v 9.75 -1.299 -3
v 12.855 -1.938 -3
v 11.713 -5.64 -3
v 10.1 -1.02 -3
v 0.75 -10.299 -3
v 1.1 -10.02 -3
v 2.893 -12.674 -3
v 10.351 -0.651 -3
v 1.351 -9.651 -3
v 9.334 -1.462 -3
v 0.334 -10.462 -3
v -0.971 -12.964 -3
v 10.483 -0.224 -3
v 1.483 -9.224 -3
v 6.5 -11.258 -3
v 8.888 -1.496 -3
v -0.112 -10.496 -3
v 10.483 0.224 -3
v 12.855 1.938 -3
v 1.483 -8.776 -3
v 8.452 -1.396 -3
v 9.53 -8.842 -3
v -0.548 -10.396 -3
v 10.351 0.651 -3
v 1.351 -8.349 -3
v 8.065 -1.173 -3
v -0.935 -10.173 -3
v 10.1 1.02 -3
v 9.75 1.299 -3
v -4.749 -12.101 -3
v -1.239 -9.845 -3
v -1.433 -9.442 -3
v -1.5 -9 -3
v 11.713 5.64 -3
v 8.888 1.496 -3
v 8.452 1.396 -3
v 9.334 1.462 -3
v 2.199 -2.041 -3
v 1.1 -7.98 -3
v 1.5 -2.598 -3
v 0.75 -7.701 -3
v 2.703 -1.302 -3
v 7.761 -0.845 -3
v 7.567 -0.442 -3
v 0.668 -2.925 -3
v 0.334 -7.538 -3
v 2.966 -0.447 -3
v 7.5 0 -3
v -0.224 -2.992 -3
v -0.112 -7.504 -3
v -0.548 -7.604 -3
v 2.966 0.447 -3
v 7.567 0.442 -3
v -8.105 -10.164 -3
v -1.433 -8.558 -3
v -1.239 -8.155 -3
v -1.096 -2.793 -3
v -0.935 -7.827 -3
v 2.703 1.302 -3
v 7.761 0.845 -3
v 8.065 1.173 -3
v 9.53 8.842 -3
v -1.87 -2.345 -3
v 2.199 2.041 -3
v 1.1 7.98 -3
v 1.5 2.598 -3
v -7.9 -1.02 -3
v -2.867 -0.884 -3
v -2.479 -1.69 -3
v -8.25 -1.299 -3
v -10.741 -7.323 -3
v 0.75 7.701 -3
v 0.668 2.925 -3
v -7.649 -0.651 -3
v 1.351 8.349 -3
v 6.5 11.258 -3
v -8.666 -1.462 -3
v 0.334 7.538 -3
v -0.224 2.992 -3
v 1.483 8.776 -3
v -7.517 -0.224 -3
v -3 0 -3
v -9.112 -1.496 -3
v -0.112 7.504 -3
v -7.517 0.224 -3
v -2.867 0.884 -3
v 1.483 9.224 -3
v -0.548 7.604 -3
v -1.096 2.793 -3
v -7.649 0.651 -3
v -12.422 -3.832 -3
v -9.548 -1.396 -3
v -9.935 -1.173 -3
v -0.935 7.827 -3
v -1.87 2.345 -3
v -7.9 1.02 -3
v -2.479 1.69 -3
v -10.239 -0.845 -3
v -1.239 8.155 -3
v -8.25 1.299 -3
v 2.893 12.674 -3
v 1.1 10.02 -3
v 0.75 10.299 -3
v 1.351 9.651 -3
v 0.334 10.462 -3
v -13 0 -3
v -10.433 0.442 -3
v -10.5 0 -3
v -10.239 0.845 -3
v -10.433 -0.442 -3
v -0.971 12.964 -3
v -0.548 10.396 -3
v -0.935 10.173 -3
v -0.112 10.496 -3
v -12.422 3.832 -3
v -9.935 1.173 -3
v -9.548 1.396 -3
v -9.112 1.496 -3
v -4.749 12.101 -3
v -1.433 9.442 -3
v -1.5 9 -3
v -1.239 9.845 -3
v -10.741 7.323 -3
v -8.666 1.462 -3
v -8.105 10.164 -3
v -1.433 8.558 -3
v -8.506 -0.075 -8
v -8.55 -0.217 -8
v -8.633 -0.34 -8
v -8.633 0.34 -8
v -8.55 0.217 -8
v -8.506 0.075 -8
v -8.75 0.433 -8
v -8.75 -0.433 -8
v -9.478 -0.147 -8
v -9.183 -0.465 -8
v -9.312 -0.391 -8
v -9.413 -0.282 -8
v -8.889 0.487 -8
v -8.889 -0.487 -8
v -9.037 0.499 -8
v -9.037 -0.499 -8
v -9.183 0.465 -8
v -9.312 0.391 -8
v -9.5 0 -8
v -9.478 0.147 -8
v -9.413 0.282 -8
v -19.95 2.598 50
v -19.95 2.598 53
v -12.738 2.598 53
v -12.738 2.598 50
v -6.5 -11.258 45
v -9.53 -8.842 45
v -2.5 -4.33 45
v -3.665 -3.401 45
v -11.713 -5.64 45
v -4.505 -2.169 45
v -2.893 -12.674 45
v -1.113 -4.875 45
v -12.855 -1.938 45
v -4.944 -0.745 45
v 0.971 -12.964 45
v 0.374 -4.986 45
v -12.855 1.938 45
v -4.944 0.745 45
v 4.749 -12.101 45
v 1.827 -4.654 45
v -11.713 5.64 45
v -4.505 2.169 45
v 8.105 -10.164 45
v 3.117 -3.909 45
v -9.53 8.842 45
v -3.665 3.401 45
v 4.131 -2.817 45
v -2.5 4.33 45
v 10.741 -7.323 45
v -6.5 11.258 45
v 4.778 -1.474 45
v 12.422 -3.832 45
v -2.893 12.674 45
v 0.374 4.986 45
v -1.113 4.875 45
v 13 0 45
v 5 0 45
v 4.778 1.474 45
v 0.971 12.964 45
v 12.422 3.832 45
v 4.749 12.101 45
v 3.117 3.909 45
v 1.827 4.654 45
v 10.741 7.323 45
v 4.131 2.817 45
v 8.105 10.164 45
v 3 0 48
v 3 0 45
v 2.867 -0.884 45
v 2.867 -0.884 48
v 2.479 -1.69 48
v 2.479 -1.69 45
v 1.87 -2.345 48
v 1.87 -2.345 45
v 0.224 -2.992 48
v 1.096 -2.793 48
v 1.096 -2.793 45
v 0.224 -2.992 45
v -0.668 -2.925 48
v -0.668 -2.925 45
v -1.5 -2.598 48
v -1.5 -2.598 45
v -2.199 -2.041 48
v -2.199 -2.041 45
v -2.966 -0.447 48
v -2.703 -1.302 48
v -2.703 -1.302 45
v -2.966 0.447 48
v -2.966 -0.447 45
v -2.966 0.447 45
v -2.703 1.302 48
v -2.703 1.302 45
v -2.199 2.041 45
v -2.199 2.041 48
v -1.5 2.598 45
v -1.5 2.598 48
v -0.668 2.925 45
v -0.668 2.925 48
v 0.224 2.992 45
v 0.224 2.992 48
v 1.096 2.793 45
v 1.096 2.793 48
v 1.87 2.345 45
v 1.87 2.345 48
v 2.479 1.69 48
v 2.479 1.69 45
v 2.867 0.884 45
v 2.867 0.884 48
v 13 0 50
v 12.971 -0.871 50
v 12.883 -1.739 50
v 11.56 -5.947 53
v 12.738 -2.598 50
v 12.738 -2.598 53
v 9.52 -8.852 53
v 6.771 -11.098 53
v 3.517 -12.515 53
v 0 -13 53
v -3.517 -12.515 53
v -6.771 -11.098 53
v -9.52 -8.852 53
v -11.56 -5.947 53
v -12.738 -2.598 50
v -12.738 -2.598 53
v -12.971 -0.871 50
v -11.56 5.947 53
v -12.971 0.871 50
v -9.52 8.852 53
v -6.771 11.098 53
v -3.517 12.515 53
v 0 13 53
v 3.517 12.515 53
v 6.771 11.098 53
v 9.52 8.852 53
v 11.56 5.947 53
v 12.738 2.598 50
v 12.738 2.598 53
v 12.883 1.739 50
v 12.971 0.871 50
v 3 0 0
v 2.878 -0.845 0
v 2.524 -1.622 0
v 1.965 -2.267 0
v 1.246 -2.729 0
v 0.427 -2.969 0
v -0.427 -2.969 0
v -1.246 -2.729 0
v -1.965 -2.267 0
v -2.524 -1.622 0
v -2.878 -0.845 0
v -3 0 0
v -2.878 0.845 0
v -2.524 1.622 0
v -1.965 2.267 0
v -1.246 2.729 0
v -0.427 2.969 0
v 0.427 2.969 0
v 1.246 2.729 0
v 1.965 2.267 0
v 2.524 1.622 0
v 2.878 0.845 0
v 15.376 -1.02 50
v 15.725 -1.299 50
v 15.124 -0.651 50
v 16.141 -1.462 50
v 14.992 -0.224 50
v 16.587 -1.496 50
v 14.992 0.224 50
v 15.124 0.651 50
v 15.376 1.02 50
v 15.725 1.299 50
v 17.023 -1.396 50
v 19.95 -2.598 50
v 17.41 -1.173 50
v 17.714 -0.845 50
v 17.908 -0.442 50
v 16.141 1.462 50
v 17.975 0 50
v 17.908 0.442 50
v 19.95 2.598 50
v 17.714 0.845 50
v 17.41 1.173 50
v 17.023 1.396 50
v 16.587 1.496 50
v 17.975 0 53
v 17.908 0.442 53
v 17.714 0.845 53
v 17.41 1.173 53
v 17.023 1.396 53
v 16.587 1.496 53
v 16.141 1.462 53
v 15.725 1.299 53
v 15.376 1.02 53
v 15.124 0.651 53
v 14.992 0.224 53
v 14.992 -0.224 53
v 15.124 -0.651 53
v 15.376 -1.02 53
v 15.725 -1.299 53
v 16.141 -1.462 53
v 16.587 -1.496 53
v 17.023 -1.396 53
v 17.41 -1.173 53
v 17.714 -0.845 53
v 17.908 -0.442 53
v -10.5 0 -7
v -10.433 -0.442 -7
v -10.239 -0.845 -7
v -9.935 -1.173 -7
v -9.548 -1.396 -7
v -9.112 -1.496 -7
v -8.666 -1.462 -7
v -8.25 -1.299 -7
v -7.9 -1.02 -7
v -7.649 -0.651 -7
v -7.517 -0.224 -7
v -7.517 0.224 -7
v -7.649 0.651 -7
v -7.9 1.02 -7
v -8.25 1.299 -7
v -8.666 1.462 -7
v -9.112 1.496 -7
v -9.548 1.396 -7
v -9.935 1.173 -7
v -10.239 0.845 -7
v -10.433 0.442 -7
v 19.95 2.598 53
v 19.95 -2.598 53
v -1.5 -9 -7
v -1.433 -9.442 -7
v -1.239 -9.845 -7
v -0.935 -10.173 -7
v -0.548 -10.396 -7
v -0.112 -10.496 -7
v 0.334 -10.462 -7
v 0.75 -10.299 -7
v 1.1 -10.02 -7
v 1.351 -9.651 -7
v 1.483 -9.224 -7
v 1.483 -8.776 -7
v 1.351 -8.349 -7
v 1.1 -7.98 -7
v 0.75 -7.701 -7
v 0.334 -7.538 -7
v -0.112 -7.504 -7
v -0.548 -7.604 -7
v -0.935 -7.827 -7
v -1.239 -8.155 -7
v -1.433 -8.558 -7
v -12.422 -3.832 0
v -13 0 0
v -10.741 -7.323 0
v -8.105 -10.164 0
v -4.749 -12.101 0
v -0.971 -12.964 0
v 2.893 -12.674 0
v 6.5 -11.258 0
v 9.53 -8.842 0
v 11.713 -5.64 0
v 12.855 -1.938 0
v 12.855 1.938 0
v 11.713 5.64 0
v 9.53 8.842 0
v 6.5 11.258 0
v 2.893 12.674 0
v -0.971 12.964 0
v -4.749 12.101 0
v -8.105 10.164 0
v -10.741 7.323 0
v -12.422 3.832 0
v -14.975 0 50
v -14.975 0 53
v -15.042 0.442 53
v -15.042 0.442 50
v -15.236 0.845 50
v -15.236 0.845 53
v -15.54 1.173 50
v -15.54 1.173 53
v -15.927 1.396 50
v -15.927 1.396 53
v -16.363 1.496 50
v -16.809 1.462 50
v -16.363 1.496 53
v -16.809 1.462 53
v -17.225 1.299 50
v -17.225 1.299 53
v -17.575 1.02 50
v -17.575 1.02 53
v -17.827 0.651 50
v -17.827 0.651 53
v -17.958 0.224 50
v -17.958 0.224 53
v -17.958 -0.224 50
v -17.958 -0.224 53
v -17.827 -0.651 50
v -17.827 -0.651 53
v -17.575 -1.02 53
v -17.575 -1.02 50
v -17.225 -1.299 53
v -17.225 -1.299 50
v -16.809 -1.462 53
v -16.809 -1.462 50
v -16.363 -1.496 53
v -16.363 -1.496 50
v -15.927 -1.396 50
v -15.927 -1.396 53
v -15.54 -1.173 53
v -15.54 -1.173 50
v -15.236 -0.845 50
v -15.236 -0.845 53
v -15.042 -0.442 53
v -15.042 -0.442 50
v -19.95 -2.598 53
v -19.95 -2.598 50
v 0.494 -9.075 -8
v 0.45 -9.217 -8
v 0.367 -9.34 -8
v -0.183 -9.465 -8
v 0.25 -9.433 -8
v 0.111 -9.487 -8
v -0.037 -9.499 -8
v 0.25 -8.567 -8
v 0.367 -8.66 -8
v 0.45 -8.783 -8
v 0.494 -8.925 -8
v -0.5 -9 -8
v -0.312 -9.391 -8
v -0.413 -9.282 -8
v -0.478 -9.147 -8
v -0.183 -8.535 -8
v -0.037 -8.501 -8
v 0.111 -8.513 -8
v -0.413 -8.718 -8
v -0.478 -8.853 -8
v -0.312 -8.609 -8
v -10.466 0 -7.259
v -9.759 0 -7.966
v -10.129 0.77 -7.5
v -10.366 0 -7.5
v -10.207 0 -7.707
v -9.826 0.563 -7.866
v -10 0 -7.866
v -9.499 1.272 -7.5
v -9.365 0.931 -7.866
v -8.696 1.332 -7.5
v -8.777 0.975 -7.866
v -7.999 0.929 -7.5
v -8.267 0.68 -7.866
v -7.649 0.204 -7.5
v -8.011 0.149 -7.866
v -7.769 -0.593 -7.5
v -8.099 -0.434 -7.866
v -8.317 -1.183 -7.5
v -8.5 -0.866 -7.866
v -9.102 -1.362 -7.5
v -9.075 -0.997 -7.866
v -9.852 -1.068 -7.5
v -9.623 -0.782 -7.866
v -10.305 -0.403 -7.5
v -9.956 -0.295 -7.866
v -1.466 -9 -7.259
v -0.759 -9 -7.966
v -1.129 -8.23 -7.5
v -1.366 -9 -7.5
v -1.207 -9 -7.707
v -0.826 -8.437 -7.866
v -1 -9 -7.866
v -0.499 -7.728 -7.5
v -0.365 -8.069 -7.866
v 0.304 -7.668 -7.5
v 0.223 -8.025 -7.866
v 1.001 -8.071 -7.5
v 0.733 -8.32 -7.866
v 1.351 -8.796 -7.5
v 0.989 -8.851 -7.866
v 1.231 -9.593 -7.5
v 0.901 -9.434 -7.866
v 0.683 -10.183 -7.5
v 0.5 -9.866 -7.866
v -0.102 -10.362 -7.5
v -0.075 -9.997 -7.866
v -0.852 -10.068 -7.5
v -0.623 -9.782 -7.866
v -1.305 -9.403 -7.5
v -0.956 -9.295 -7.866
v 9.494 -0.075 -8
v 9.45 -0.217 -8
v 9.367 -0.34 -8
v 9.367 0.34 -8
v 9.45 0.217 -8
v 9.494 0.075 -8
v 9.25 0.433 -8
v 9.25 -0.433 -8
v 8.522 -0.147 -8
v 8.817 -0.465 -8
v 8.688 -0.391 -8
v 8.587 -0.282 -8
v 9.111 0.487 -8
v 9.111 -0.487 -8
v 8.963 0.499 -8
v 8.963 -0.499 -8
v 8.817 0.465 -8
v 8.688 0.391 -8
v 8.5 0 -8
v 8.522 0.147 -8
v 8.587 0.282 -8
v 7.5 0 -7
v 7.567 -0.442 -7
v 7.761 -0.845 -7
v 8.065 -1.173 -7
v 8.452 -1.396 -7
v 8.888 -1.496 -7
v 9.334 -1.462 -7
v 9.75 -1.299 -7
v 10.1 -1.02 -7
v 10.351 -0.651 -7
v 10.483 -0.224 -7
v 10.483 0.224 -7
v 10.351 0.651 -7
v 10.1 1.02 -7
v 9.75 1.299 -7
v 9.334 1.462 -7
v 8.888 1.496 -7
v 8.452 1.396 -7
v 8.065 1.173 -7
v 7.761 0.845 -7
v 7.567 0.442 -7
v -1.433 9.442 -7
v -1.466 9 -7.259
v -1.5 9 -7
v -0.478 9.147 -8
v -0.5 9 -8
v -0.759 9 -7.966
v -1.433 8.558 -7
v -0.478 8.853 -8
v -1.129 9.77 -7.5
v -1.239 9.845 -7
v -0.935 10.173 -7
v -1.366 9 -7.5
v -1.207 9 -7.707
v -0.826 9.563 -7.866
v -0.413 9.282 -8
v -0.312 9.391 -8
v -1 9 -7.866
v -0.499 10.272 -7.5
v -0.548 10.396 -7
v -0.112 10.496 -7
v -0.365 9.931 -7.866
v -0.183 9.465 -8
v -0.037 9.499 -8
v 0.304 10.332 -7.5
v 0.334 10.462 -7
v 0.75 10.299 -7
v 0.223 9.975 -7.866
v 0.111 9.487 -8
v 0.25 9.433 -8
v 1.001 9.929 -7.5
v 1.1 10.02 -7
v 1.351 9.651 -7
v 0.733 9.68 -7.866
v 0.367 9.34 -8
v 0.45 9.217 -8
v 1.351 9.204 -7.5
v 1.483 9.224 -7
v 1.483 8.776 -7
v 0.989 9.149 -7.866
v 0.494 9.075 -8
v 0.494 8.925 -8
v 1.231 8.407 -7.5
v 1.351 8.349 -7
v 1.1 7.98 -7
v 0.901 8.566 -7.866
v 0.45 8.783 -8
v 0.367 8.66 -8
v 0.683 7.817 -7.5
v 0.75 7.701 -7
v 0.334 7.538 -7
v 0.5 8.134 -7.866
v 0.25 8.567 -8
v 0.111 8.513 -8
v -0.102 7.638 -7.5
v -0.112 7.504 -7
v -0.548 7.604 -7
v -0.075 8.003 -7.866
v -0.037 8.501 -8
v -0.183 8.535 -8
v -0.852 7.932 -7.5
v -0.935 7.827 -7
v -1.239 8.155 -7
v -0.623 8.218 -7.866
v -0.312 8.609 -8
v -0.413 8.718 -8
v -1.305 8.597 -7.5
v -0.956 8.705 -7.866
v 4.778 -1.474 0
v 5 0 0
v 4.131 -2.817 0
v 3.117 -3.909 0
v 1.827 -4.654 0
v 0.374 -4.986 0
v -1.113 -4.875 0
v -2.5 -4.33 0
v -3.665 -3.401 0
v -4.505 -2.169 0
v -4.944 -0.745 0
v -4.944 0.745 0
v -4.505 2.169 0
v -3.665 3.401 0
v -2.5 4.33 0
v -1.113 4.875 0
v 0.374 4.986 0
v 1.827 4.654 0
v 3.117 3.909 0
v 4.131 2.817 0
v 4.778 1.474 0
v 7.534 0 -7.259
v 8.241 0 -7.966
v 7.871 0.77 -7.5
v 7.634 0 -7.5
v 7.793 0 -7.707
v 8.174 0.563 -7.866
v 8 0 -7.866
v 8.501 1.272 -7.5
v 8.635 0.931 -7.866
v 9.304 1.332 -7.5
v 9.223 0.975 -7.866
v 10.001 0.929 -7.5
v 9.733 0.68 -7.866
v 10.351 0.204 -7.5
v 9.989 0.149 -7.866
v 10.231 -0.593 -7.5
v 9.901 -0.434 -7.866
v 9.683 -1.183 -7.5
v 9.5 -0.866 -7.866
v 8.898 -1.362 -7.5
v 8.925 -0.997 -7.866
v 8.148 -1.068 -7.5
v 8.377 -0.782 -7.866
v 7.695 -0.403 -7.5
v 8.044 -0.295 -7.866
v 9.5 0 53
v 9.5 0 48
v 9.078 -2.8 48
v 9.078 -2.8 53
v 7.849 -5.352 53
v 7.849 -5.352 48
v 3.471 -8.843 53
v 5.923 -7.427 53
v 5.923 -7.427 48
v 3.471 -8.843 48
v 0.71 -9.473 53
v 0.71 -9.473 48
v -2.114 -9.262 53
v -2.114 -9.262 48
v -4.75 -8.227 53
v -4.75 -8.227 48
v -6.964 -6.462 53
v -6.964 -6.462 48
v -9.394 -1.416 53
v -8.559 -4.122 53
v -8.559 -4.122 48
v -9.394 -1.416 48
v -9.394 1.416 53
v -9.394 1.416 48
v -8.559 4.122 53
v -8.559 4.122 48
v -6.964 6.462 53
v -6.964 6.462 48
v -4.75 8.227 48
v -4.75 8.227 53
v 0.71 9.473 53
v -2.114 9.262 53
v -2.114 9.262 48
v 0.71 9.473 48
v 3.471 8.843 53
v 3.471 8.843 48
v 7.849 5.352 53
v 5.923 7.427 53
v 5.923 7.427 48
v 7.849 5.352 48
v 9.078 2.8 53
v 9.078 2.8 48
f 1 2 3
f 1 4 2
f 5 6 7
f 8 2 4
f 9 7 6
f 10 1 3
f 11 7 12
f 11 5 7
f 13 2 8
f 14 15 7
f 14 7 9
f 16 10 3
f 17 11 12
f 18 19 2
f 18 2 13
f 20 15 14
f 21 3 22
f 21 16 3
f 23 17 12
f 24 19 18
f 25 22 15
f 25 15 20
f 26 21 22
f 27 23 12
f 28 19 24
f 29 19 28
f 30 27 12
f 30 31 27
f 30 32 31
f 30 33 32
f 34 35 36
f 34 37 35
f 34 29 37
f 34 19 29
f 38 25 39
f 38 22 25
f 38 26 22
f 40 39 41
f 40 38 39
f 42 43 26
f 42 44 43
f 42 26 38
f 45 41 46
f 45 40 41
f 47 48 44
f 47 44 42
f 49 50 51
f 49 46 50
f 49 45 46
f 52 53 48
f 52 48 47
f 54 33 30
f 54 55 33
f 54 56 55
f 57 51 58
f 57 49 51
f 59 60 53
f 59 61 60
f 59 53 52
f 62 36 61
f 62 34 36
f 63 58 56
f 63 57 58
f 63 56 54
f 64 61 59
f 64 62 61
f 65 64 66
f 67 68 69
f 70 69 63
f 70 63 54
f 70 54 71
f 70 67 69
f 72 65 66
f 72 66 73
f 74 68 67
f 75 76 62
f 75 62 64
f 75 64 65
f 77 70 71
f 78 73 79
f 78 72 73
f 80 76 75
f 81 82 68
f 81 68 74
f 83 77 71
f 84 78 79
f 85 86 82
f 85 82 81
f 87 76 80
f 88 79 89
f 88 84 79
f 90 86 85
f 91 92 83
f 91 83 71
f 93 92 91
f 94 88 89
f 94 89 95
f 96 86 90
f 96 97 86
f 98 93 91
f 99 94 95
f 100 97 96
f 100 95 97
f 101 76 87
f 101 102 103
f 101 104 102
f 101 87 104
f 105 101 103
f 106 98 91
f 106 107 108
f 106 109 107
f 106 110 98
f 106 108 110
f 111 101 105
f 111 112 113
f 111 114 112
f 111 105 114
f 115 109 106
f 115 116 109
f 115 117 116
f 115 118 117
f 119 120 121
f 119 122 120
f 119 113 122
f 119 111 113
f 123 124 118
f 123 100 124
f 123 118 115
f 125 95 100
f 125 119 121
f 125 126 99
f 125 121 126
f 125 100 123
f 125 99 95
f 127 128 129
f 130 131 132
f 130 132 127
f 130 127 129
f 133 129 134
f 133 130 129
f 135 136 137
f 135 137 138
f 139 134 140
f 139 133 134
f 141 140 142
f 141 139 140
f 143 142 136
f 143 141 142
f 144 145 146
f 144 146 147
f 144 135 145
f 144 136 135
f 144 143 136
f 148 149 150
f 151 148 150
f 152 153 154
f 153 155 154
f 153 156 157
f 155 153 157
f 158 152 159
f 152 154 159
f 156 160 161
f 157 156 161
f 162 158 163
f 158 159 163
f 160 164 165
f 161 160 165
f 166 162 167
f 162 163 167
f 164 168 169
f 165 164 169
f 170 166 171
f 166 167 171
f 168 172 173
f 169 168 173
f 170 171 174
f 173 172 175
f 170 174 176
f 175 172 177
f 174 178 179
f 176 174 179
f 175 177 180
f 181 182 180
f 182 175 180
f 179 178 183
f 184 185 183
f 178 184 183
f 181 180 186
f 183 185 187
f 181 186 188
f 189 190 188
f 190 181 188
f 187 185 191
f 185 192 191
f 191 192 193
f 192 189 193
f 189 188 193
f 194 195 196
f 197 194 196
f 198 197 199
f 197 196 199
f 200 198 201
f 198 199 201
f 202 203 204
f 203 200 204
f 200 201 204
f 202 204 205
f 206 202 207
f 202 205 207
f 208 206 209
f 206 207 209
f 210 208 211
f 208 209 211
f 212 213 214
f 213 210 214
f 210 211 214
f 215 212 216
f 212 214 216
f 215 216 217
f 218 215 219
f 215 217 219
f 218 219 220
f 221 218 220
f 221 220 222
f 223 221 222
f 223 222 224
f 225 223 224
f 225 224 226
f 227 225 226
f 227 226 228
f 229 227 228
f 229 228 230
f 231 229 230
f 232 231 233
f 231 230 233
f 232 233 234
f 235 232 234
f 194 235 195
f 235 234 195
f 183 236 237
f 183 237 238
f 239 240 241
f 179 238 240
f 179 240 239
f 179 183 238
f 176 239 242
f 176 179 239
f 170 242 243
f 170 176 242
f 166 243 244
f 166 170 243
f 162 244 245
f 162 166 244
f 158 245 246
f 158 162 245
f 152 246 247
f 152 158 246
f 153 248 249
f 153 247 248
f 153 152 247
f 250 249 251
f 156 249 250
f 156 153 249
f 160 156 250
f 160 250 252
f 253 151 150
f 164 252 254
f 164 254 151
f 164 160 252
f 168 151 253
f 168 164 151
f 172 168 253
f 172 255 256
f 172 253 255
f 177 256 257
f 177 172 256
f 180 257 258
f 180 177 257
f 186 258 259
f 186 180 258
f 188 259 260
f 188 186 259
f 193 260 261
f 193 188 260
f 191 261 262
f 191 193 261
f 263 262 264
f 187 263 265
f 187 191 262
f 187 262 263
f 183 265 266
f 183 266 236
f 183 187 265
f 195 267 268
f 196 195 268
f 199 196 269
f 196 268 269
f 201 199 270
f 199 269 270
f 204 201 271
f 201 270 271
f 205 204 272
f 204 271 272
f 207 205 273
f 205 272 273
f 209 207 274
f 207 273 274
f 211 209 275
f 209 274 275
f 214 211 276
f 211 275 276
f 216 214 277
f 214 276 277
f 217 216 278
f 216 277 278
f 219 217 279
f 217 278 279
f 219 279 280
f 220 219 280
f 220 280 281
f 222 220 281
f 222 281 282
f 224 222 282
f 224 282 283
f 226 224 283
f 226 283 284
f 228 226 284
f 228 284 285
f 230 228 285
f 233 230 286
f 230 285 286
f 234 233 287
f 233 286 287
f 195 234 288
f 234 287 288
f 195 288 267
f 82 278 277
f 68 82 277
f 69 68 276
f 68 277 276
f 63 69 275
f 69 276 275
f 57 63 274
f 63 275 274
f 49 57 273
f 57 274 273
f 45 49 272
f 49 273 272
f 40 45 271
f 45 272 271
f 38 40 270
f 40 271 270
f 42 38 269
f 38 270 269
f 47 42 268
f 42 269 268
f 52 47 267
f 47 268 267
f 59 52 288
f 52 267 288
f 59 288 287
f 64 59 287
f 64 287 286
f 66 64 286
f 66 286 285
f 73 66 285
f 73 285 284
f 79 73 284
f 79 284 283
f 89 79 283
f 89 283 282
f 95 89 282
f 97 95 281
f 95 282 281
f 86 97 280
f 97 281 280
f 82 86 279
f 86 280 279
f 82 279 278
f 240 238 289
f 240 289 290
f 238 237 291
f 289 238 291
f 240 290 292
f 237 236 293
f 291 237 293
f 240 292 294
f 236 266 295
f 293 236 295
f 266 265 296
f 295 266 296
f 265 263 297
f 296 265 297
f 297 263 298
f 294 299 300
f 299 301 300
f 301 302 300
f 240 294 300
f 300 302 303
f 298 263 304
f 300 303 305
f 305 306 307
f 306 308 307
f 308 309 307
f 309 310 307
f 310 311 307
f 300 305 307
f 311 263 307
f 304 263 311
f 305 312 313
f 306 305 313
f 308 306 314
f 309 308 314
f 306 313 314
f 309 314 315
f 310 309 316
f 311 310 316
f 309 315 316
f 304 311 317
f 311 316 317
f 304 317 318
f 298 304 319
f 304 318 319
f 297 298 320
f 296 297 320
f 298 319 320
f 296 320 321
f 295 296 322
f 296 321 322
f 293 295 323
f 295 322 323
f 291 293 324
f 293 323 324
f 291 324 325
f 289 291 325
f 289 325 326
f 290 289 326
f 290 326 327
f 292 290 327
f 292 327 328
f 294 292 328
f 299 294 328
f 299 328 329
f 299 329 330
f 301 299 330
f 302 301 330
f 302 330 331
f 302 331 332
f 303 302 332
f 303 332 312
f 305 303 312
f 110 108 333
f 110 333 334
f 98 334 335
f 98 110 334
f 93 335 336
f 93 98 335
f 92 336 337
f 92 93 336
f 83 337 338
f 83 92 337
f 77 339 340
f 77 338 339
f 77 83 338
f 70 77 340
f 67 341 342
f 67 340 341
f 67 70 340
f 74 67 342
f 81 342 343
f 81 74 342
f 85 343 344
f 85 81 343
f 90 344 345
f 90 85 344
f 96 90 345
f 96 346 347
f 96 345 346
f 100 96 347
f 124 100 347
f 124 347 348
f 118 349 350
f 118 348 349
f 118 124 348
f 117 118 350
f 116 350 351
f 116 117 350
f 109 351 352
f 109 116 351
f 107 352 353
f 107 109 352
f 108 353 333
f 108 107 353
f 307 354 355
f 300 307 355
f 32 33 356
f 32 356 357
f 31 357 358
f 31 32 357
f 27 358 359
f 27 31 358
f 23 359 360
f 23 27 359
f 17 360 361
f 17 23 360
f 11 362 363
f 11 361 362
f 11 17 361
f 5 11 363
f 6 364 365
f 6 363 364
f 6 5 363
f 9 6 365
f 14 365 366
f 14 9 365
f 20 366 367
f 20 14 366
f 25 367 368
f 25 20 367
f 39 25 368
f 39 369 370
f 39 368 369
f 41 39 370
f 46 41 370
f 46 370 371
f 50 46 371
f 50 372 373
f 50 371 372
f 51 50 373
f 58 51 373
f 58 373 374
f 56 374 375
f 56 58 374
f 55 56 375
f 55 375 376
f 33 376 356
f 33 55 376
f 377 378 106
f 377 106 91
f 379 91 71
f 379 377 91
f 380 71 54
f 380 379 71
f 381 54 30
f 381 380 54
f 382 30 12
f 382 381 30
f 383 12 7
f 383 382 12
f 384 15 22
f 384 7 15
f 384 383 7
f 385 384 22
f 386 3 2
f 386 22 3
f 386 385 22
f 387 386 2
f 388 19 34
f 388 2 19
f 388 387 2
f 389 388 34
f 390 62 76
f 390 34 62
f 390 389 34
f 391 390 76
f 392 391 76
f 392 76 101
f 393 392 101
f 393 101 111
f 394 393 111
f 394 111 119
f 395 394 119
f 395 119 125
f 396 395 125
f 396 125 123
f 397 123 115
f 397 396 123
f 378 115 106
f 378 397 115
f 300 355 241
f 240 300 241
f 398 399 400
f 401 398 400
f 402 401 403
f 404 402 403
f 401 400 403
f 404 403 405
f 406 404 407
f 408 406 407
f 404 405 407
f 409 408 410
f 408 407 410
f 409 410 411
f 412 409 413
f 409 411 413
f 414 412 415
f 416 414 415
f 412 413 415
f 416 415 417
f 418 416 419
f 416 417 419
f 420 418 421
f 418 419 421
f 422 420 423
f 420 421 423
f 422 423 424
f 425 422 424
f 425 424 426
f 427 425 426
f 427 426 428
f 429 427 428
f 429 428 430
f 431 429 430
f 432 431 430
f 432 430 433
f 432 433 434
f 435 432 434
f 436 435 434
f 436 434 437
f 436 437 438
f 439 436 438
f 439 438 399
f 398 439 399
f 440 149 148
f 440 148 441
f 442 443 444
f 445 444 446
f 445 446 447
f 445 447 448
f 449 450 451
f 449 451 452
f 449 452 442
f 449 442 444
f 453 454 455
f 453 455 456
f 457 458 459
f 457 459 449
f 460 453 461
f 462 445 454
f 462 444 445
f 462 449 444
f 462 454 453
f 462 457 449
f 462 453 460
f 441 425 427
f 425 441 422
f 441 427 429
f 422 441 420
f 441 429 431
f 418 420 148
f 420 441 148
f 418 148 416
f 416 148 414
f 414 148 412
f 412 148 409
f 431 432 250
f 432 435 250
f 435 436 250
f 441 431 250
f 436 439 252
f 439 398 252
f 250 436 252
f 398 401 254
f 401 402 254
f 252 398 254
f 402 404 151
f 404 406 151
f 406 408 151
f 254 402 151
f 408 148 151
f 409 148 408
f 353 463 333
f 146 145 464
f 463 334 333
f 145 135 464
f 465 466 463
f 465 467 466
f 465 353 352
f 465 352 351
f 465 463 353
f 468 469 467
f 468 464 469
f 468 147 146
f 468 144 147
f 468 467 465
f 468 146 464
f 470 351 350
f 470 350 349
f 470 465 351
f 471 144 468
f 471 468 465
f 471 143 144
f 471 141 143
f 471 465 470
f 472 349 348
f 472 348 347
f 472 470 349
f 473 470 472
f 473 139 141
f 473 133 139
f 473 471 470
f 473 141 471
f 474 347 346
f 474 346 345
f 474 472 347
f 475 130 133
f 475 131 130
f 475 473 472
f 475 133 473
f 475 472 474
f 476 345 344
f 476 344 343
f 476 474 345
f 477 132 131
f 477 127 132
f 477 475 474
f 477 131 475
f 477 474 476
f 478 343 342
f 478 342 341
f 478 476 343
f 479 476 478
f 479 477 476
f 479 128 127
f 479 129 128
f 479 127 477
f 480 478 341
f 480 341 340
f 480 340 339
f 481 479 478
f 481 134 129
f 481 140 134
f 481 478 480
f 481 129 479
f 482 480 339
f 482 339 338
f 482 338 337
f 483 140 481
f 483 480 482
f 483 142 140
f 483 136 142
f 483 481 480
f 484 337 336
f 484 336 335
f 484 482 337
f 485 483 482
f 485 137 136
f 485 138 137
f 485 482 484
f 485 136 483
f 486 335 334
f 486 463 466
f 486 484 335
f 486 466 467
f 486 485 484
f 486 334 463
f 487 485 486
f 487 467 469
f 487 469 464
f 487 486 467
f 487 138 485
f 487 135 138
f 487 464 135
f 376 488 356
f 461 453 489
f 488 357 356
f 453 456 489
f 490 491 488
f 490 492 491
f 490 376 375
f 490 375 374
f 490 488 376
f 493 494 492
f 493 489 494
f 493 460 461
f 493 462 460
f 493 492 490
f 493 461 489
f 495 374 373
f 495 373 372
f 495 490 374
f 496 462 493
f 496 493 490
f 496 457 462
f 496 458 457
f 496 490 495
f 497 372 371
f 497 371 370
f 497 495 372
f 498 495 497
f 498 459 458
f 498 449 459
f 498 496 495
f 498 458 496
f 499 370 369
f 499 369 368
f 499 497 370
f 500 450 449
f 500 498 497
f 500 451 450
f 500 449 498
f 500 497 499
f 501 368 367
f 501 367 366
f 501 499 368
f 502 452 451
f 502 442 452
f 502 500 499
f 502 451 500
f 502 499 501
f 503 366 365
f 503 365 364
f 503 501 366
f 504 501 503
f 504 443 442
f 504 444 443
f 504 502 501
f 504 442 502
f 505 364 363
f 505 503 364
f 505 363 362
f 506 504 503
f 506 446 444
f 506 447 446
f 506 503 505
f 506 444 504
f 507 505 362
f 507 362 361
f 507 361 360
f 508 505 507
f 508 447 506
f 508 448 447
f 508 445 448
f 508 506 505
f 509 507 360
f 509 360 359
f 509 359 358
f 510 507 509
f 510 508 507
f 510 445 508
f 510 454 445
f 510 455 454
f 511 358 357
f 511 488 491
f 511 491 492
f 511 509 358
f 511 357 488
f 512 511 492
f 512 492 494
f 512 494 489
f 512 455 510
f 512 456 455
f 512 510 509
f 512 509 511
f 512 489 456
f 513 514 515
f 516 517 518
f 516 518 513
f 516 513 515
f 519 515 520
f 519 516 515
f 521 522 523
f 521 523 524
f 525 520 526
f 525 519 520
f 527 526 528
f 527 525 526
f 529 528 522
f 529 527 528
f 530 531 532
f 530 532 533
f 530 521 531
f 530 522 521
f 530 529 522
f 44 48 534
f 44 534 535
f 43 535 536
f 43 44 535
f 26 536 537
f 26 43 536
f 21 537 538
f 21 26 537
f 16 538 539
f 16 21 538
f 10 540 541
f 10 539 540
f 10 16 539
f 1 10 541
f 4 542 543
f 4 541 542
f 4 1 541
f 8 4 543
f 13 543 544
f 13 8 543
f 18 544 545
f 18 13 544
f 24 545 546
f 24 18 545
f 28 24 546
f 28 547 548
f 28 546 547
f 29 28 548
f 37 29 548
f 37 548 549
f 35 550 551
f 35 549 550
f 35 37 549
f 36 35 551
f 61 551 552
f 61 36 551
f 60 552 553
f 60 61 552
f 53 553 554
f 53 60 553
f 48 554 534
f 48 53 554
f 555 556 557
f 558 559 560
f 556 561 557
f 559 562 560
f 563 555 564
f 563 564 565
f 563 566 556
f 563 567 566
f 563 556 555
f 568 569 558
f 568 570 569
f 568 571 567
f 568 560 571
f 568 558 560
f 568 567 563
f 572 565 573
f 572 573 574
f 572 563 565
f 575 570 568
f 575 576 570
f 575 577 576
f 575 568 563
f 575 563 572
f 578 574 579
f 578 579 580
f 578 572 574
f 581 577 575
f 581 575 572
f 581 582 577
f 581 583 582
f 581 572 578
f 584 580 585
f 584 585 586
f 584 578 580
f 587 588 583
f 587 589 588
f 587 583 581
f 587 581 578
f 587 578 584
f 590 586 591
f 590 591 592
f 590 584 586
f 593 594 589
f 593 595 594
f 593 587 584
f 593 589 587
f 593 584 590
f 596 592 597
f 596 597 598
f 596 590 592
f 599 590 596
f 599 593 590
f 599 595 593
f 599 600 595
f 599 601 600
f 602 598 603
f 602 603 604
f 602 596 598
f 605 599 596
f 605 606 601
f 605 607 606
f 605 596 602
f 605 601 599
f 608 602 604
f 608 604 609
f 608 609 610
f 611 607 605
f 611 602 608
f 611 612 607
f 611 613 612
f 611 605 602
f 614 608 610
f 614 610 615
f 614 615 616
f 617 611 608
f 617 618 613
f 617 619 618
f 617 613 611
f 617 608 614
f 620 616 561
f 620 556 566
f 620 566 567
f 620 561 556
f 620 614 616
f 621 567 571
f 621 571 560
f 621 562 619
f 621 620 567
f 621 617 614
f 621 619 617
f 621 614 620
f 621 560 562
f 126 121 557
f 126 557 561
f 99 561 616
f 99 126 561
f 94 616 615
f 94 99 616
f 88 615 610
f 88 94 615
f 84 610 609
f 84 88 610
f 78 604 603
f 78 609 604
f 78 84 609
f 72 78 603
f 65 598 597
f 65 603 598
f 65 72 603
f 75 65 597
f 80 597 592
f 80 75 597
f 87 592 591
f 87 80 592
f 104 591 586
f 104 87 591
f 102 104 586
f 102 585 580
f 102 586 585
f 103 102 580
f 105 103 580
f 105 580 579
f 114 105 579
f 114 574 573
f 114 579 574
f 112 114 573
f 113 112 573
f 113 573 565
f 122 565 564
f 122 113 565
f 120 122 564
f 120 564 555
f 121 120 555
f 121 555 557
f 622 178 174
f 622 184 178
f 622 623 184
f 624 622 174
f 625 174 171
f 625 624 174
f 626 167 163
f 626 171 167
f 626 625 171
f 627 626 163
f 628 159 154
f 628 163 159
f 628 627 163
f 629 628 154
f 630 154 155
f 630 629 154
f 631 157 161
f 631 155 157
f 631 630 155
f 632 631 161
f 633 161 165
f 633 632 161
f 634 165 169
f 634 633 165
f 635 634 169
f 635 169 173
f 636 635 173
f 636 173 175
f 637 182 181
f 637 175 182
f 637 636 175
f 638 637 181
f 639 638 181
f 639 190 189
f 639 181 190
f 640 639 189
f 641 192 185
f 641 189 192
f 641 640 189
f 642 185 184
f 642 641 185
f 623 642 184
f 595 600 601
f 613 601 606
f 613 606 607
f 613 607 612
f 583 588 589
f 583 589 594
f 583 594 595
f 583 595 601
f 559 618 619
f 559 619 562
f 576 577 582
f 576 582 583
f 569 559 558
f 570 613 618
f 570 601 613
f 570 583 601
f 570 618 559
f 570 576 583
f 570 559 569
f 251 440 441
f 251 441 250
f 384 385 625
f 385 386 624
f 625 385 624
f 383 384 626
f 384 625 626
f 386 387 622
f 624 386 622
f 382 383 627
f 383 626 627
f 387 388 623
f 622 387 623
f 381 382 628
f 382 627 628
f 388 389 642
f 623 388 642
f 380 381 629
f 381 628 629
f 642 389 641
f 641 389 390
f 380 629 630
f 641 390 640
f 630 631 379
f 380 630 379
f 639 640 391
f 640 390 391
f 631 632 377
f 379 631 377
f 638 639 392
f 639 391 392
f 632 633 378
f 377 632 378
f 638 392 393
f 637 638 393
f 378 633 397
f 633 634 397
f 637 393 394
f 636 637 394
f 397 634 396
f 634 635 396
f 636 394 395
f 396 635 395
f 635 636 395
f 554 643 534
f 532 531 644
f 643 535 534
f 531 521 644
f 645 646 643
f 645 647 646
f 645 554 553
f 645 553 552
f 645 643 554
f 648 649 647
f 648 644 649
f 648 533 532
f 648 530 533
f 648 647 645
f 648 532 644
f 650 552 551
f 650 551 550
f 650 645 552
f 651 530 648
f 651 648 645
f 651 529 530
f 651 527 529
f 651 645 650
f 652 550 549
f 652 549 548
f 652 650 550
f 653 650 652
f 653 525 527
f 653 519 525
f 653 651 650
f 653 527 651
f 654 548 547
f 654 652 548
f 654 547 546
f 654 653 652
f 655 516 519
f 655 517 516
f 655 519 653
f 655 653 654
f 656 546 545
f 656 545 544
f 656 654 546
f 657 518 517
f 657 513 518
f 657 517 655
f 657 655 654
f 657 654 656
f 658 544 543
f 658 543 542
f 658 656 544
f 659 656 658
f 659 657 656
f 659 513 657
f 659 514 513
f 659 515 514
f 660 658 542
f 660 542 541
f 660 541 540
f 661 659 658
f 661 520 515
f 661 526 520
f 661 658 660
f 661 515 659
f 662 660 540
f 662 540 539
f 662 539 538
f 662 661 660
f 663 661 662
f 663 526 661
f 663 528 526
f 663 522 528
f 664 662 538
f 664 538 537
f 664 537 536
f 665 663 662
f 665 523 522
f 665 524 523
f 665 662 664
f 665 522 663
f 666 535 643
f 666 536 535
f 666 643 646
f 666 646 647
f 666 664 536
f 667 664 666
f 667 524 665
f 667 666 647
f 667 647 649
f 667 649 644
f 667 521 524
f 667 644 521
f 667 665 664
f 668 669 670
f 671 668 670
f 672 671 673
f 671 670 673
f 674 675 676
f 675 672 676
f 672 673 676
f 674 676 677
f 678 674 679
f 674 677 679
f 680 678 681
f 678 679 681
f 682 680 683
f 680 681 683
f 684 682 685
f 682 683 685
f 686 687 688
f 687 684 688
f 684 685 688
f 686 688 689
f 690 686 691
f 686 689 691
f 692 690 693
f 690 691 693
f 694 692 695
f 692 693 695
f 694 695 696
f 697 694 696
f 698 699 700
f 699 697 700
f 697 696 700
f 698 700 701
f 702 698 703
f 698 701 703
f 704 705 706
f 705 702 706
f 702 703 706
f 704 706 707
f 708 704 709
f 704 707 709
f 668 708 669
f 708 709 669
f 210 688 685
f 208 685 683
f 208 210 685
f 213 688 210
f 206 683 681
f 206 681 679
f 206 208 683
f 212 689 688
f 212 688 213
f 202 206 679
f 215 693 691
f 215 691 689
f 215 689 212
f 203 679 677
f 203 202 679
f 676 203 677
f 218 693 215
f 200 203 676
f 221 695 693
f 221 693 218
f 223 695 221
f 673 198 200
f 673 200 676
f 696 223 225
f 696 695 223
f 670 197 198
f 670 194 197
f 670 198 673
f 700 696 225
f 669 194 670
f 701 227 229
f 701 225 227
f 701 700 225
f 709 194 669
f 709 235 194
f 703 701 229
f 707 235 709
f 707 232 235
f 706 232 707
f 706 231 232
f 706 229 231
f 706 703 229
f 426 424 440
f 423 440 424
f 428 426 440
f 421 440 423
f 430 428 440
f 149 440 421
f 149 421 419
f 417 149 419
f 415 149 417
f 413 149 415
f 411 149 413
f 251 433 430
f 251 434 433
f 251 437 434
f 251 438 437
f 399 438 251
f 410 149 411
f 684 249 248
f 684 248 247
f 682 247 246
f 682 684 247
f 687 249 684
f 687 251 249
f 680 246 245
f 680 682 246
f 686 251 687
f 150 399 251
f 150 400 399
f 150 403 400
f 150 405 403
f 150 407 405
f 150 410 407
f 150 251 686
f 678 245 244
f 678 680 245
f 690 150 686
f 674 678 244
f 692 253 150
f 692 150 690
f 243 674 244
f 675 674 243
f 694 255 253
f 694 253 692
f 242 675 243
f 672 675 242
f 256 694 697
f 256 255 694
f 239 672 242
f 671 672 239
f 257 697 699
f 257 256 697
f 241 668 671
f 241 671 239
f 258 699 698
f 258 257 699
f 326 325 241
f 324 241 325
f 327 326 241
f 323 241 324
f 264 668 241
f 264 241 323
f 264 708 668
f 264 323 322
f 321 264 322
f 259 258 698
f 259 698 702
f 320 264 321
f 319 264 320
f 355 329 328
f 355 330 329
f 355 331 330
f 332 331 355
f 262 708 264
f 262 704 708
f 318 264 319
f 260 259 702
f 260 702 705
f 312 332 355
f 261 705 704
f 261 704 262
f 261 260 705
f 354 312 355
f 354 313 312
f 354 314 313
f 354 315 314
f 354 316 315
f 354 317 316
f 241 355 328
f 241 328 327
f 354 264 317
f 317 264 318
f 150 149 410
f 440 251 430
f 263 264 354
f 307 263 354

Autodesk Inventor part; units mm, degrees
ref_plane "YZ Plane" through (0, 0, 0) normal (1, 0, 0) x (0, 1, 0)
ref_plane "XZ Plane" through (0, 0, 0) normal (0, 1, 0) x (-1, 0, 0)
ref_plane "XY Plane" through (0, 0, 0) normal (0, 0, 1) x (1, 0, 0)
sketch "Эскиз1" plane through (0, 0, 0) normal (0, 0, 1) x (1, 0, 0)
  circle A0 centre (0, 0) radius 3
  circle A1 centre (0, 0) radius 5
  dimension "d0" = 6
  dimension "d1" = 10
extrude "Выдавливание1" add sketch "Эскиз1" along normal blind 45
sketch "Эскиз2" plane through (0, 0, 0) normal (0, 0, -1) x (-1, 0, 0)
  circle A0 centre (0, 0) radius 13
  circle A1 centre (0, 0) radius 5 projected
  circle A2 centre (0, 0) radius 3 projected
  dimension "d4" = 26
extrude "Выдавливание2" add sketch "Эскиз2" along normal blind 3 contours A0 | A1
sketch "Эскиз3" plane through (0, 0, -3) normal (0, 0, -1) x (-1, 0, 0)
  circle A0 centre (0, 9) radius 1.5
  circle A1 centre (-9, 0) radius 1.5
  circle A2 centre (0, -9) radius 1.5
  circle A3 centre (9, 0) radius 1.5
  circle A4 centre (0, 0) radius 5 projected
  dimension "d7" = 3
  dimension "d8" = 3
  dimension "d10" = 3
  dimension "d23" = 3
  dimension "d24" = 9
  dimension "d25" = 9
  dimension "d26" = 9
  dimension "d27" = 9
extrude "Выдавливание3" add sketch "Эскиз3" along normal blind 5 contours A0 | A1 | A2 | A3
fillet "Сопряжение1" radius 1 4 edges at (1.5, 9, -8) (10.5, 0, -8) (1.5, -9, -8) (-7.5, 0, -8)
sketch "Эскиз4" plane through (0, 0, 45) normal (0, 0, 1) x (1, 0, 0)
  circle A0 centre (0, 9) radius 1.5 projected
  circle A1 centre (0, 0) radius 13 projected
  circle A2 centre (0, 0) radius 5 projected
  circle A3 centre (0, 0) radius 3 projected
  point P0 (-0.5792, 4.9663)
  point P1 (0.5792, 4.9663)
extrude "Выдавливание4" add sketch "Эскиз4" along normal blind 3 contours A0 | A1 | A2
sketch "Эскиз6" plane through (0, 0, 48) normal (0, 0, 1) x (1, 0, 0)
  circle A0 centre (0, 0) radius 9.5
  circle A1 centre (0, 0) radius 13 projected
  dimension "d19" = 19
extrude "Выдавливание6" add sketch "Эскиз6" along normal blind 5
sketch "Эскиз8" plane through (0, 0, 53) normal (0, 0, 1) x (1, 0, 0)
  circle A0 centre (-16.4751, 0) radius 1.5
  circle A1 centre (0, 9) radius 1.5
  arc A2 (1.4487, -9.3889) -> (-1.4487, -9.3889) centre (0, -9) ccw
  line L0 (0, 9) -> (0, -9)
  circle A3 centre (0, 0) radius 13
  circle A4 centre (0, 0) radius 9.5
  line L1 (-13, 2.5984) -> (-11.6906, 2.5984)
  line L2 (-13, -2.5984) -> (-12.3453, -2.5984)
  line L3 (-13, -2.5984) -> (-13, 2.5984)
  line L4 (-19.9502, -2.5984) -> (-13, -2.5984)
  line L5 (-19.9502, 2.5984) -> (-19.9502, -2.5984)
  line L6 (-19.9502, -2.5984) -> (-13, 2.5984) construction
  line L7 (-13, -2.5984) -> (-19.9502, 2.5984) construction
  line L8 (-13, 2.5984) -> (-19.9502, 2.5984)
  circle A5 centre (16.4751, 0) radius 1.5
  line L9 (13, 2.5984) -> (11.6906, 2.5984)
  line L10 (13, -2.5984) -> (12.3453, -2.5984)
  line L11 (13, -2.5984) -> (13, 2.5984)
  circle A6 centre (16.4751, 0) radius 1.5
  line L12 (19.9502, -2.5984) -> (13, -2.5984)
  line L13 (13, 2.5984) -> (19.9502, 2.5984)
  line L14 (19.9502, -2.5984) -> (13, 2.5984) construction
  line L15 (13, -2.5984) -> (19.9502, 2.5984) construction
  line L16 (19.9502, 2.5984) -> (19.9502, -2.5984)
  point P0 (12.7377, 2.5984)
  point P1 (12.7377, -2.5984)
  point P2 (-12.7377, -2.5984)
  point P3 (-12.7377, 2.5984)
  dimension "d30" = 3
extrude "Выдавливание7" add sketch "Эскиз8" against normal blind 3 contours L11 L10 A3 | L11 L13 L16 L12 | A3 L9 L11 | A3 L3 L1 | L2 L3 A3 | L3 L4 L5 L8
properties part number "вт1"
